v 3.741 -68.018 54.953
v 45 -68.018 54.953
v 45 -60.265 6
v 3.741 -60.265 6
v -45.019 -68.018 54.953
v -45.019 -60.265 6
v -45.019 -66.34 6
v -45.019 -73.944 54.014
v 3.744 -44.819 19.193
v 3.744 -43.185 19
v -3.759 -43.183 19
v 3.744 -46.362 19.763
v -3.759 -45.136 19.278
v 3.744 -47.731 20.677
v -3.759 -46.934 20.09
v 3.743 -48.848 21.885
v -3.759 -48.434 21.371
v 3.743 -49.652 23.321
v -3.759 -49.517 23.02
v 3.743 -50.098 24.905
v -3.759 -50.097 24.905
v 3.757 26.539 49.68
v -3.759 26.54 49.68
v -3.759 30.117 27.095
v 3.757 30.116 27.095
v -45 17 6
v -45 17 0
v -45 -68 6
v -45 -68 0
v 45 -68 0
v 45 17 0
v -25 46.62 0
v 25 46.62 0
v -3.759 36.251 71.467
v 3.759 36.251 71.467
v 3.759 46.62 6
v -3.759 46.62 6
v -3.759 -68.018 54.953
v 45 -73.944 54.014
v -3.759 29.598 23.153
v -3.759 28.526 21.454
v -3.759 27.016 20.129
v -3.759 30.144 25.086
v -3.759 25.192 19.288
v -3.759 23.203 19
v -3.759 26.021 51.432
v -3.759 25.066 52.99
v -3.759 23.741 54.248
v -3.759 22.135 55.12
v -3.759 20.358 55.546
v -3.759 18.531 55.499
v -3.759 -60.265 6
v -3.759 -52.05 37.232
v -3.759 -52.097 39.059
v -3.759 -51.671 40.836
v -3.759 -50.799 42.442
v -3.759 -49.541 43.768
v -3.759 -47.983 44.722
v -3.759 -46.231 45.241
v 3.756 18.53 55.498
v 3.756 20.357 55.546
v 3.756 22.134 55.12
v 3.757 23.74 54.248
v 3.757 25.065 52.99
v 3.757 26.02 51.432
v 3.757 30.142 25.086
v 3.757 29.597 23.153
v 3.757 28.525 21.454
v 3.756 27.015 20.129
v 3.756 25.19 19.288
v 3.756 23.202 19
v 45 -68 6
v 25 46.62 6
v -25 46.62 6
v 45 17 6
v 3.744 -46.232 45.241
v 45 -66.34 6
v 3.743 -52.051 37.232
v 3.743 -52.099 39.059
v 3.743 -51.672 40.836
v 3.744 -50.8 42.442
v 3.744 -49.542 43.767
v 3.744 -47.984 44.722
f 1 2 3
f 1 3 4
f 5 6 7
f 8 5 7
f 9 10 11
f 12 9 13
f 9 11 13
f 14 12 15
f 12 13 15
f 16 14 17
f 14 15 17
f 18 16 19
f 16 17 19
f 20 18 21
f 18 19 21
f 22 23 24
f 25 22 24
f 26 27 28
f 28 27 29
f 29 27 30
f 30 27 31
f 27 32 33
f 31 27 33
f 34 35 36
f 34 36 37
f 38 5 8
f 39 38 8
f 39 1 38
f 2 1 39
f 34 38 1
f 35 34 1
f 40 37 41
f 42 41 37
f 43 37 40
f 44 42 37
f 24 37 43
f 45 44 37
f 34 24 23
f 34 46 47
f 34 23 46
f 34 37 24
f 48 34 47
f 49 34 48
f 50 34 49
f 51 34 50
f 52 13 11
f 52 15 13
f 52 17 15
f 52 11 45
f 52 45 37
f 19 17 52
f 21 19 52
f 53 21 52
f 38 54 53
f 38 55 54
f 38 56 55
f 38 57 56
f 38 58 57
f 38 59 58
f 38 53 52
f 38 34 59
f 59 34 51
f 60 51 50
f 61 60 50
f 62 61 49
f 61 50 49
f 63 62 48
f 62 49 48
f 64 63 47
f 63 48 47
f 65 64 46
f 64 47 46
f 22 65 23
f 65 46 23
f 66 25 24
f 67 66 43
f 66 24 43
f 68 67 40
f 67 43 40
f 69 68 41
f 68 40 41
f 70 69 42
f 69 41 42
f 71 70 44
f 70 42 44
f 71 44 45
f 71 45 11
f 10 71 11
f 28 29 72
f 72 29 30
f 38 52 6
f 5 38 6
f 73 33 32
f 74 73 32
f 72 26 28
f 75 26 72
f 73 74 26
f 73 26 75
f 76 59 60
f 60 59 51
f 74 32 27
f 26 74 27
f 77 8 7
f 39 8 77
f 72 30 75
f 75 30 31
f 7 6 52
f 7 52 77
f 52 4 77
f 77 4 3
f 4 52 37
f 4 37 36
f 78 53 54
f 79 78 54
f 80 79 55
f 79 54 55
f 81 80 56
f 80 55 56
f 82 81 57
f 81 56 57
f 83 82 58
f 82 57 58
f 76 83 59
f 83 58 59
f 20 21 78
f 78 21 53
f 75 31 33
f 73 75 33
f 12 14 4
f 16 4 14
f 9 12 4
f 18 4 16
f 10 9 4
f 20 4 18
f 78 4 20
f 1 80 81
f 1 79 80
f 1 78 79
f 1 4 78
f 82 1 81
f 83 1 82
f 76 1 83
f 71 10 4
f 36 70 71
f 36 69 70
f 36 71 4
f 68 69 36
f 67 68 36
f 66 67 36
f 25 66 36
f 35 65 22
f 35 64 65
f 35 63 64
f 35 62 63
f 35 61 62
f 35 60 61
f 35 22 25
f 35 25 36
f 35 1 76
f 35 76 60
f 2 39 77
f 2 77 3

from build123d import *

# Parameters (mm, degrees)
BOSS_EXTRUDE1_DEPTH = 6
BOSS_EXTRUDE3_REACH = 99.376
CUT_EXTRUDE1_DEPTH  = 7.516274167


with BuildPart() as part:
    # Sketch1 → Boss-Extrude1 (new body)
    with BuildSketch(Plane.XY):
        Polygon((-45, -68), (45, -68), (45, 17), (25, 46.620442646), (-25, 46.620442646), (-45, 17), align=None)
    extrude(amount=BOSS_EXTRUDE1_DEPTH)


with BuildPart() as body_2:
    # Boss-Extrude3: up to this plane
    boss_extrude3_end = Plane(origin=(0, 0, 6), z_dir=(0, 0, 1))
    # Sketch2 → Boss-Extrude3 (new, up to the surface)
    with BuildSketch(Plane(origin=(0, -10.155161239, 64.117164656), x_dir=(-1, 0, 0), z_dir=(0, 0.15643446504022426, -0.9876883405951389)), mode=Mode.PRIVATE) as boss_extrude3_sk1:
        Polygon((45.018744933, -64.584267711), (-45, -64.584267711), (-45, -58.584267711), (-3.741030689, -58.584267711), (-3.759259362, 46.984422973), (3.759259418, 46.985074426), (3.759259418, -58.584267711), (45.018744933, -58.584267711), align=None)
    boss_extrude3_tool1 = split(extrude(boss_extrude3_sk1.sketch, amount=BOSS_EXTRUDE3_REACH, mode=Mode.PRIVATE), bisect_by=boss_extrude3_end, keep=Keep.BOTH, mode=Mode.PRIVATE)
    add(boss_extrude3_tool1.solids().sort_by_distance((-0.00651, -38.1979, 59.675631))[0])

    # Sketch3 → Cut-Extrude1 (cut, along a direction that is not the sketch's normal)
    with BuildSketch(Plane.ZY.offset(3.759259418)):
        with BuildLine():
            Line((49.679834781, 26.540189826), (27.095041255, 30.117269708))
            ThreePointArc((27.095041255, 30.117269708), (21.453863662, 28.526293083), (19, 23.203451324))
            Line((19, 23.203451324), (19, -43.18322091))
            ThreePointArc((19, -43.18322091), (20.677158241, -47.729357249), (24.904958745, -50.097039294))
            Line((24.904958745, -50.097039294), (37.23244731, -52.049521672))
            ThreePointArc((37.23244731, -52.049521672), (42.441985332, -50.798822248), (45.24130695, -46.230744543))
            Line((45.24130695, -46.230744543), (55.49861191, 18.531330187))
            ThreePointArc((55.49861191, 18.531330187), (54.247912486, 23.740868208), (49.679834781, 26.540189826))
        make_face()
    extrude(amount=-CUT_EXTRUDE1_DEPTH, dir=(-0.9999999850923286, 0.0001705453289228096, 2.7011726471330954e-05), mode=Mode.SUBTRACT)


solid = Compound([part.part, body_2.part])
